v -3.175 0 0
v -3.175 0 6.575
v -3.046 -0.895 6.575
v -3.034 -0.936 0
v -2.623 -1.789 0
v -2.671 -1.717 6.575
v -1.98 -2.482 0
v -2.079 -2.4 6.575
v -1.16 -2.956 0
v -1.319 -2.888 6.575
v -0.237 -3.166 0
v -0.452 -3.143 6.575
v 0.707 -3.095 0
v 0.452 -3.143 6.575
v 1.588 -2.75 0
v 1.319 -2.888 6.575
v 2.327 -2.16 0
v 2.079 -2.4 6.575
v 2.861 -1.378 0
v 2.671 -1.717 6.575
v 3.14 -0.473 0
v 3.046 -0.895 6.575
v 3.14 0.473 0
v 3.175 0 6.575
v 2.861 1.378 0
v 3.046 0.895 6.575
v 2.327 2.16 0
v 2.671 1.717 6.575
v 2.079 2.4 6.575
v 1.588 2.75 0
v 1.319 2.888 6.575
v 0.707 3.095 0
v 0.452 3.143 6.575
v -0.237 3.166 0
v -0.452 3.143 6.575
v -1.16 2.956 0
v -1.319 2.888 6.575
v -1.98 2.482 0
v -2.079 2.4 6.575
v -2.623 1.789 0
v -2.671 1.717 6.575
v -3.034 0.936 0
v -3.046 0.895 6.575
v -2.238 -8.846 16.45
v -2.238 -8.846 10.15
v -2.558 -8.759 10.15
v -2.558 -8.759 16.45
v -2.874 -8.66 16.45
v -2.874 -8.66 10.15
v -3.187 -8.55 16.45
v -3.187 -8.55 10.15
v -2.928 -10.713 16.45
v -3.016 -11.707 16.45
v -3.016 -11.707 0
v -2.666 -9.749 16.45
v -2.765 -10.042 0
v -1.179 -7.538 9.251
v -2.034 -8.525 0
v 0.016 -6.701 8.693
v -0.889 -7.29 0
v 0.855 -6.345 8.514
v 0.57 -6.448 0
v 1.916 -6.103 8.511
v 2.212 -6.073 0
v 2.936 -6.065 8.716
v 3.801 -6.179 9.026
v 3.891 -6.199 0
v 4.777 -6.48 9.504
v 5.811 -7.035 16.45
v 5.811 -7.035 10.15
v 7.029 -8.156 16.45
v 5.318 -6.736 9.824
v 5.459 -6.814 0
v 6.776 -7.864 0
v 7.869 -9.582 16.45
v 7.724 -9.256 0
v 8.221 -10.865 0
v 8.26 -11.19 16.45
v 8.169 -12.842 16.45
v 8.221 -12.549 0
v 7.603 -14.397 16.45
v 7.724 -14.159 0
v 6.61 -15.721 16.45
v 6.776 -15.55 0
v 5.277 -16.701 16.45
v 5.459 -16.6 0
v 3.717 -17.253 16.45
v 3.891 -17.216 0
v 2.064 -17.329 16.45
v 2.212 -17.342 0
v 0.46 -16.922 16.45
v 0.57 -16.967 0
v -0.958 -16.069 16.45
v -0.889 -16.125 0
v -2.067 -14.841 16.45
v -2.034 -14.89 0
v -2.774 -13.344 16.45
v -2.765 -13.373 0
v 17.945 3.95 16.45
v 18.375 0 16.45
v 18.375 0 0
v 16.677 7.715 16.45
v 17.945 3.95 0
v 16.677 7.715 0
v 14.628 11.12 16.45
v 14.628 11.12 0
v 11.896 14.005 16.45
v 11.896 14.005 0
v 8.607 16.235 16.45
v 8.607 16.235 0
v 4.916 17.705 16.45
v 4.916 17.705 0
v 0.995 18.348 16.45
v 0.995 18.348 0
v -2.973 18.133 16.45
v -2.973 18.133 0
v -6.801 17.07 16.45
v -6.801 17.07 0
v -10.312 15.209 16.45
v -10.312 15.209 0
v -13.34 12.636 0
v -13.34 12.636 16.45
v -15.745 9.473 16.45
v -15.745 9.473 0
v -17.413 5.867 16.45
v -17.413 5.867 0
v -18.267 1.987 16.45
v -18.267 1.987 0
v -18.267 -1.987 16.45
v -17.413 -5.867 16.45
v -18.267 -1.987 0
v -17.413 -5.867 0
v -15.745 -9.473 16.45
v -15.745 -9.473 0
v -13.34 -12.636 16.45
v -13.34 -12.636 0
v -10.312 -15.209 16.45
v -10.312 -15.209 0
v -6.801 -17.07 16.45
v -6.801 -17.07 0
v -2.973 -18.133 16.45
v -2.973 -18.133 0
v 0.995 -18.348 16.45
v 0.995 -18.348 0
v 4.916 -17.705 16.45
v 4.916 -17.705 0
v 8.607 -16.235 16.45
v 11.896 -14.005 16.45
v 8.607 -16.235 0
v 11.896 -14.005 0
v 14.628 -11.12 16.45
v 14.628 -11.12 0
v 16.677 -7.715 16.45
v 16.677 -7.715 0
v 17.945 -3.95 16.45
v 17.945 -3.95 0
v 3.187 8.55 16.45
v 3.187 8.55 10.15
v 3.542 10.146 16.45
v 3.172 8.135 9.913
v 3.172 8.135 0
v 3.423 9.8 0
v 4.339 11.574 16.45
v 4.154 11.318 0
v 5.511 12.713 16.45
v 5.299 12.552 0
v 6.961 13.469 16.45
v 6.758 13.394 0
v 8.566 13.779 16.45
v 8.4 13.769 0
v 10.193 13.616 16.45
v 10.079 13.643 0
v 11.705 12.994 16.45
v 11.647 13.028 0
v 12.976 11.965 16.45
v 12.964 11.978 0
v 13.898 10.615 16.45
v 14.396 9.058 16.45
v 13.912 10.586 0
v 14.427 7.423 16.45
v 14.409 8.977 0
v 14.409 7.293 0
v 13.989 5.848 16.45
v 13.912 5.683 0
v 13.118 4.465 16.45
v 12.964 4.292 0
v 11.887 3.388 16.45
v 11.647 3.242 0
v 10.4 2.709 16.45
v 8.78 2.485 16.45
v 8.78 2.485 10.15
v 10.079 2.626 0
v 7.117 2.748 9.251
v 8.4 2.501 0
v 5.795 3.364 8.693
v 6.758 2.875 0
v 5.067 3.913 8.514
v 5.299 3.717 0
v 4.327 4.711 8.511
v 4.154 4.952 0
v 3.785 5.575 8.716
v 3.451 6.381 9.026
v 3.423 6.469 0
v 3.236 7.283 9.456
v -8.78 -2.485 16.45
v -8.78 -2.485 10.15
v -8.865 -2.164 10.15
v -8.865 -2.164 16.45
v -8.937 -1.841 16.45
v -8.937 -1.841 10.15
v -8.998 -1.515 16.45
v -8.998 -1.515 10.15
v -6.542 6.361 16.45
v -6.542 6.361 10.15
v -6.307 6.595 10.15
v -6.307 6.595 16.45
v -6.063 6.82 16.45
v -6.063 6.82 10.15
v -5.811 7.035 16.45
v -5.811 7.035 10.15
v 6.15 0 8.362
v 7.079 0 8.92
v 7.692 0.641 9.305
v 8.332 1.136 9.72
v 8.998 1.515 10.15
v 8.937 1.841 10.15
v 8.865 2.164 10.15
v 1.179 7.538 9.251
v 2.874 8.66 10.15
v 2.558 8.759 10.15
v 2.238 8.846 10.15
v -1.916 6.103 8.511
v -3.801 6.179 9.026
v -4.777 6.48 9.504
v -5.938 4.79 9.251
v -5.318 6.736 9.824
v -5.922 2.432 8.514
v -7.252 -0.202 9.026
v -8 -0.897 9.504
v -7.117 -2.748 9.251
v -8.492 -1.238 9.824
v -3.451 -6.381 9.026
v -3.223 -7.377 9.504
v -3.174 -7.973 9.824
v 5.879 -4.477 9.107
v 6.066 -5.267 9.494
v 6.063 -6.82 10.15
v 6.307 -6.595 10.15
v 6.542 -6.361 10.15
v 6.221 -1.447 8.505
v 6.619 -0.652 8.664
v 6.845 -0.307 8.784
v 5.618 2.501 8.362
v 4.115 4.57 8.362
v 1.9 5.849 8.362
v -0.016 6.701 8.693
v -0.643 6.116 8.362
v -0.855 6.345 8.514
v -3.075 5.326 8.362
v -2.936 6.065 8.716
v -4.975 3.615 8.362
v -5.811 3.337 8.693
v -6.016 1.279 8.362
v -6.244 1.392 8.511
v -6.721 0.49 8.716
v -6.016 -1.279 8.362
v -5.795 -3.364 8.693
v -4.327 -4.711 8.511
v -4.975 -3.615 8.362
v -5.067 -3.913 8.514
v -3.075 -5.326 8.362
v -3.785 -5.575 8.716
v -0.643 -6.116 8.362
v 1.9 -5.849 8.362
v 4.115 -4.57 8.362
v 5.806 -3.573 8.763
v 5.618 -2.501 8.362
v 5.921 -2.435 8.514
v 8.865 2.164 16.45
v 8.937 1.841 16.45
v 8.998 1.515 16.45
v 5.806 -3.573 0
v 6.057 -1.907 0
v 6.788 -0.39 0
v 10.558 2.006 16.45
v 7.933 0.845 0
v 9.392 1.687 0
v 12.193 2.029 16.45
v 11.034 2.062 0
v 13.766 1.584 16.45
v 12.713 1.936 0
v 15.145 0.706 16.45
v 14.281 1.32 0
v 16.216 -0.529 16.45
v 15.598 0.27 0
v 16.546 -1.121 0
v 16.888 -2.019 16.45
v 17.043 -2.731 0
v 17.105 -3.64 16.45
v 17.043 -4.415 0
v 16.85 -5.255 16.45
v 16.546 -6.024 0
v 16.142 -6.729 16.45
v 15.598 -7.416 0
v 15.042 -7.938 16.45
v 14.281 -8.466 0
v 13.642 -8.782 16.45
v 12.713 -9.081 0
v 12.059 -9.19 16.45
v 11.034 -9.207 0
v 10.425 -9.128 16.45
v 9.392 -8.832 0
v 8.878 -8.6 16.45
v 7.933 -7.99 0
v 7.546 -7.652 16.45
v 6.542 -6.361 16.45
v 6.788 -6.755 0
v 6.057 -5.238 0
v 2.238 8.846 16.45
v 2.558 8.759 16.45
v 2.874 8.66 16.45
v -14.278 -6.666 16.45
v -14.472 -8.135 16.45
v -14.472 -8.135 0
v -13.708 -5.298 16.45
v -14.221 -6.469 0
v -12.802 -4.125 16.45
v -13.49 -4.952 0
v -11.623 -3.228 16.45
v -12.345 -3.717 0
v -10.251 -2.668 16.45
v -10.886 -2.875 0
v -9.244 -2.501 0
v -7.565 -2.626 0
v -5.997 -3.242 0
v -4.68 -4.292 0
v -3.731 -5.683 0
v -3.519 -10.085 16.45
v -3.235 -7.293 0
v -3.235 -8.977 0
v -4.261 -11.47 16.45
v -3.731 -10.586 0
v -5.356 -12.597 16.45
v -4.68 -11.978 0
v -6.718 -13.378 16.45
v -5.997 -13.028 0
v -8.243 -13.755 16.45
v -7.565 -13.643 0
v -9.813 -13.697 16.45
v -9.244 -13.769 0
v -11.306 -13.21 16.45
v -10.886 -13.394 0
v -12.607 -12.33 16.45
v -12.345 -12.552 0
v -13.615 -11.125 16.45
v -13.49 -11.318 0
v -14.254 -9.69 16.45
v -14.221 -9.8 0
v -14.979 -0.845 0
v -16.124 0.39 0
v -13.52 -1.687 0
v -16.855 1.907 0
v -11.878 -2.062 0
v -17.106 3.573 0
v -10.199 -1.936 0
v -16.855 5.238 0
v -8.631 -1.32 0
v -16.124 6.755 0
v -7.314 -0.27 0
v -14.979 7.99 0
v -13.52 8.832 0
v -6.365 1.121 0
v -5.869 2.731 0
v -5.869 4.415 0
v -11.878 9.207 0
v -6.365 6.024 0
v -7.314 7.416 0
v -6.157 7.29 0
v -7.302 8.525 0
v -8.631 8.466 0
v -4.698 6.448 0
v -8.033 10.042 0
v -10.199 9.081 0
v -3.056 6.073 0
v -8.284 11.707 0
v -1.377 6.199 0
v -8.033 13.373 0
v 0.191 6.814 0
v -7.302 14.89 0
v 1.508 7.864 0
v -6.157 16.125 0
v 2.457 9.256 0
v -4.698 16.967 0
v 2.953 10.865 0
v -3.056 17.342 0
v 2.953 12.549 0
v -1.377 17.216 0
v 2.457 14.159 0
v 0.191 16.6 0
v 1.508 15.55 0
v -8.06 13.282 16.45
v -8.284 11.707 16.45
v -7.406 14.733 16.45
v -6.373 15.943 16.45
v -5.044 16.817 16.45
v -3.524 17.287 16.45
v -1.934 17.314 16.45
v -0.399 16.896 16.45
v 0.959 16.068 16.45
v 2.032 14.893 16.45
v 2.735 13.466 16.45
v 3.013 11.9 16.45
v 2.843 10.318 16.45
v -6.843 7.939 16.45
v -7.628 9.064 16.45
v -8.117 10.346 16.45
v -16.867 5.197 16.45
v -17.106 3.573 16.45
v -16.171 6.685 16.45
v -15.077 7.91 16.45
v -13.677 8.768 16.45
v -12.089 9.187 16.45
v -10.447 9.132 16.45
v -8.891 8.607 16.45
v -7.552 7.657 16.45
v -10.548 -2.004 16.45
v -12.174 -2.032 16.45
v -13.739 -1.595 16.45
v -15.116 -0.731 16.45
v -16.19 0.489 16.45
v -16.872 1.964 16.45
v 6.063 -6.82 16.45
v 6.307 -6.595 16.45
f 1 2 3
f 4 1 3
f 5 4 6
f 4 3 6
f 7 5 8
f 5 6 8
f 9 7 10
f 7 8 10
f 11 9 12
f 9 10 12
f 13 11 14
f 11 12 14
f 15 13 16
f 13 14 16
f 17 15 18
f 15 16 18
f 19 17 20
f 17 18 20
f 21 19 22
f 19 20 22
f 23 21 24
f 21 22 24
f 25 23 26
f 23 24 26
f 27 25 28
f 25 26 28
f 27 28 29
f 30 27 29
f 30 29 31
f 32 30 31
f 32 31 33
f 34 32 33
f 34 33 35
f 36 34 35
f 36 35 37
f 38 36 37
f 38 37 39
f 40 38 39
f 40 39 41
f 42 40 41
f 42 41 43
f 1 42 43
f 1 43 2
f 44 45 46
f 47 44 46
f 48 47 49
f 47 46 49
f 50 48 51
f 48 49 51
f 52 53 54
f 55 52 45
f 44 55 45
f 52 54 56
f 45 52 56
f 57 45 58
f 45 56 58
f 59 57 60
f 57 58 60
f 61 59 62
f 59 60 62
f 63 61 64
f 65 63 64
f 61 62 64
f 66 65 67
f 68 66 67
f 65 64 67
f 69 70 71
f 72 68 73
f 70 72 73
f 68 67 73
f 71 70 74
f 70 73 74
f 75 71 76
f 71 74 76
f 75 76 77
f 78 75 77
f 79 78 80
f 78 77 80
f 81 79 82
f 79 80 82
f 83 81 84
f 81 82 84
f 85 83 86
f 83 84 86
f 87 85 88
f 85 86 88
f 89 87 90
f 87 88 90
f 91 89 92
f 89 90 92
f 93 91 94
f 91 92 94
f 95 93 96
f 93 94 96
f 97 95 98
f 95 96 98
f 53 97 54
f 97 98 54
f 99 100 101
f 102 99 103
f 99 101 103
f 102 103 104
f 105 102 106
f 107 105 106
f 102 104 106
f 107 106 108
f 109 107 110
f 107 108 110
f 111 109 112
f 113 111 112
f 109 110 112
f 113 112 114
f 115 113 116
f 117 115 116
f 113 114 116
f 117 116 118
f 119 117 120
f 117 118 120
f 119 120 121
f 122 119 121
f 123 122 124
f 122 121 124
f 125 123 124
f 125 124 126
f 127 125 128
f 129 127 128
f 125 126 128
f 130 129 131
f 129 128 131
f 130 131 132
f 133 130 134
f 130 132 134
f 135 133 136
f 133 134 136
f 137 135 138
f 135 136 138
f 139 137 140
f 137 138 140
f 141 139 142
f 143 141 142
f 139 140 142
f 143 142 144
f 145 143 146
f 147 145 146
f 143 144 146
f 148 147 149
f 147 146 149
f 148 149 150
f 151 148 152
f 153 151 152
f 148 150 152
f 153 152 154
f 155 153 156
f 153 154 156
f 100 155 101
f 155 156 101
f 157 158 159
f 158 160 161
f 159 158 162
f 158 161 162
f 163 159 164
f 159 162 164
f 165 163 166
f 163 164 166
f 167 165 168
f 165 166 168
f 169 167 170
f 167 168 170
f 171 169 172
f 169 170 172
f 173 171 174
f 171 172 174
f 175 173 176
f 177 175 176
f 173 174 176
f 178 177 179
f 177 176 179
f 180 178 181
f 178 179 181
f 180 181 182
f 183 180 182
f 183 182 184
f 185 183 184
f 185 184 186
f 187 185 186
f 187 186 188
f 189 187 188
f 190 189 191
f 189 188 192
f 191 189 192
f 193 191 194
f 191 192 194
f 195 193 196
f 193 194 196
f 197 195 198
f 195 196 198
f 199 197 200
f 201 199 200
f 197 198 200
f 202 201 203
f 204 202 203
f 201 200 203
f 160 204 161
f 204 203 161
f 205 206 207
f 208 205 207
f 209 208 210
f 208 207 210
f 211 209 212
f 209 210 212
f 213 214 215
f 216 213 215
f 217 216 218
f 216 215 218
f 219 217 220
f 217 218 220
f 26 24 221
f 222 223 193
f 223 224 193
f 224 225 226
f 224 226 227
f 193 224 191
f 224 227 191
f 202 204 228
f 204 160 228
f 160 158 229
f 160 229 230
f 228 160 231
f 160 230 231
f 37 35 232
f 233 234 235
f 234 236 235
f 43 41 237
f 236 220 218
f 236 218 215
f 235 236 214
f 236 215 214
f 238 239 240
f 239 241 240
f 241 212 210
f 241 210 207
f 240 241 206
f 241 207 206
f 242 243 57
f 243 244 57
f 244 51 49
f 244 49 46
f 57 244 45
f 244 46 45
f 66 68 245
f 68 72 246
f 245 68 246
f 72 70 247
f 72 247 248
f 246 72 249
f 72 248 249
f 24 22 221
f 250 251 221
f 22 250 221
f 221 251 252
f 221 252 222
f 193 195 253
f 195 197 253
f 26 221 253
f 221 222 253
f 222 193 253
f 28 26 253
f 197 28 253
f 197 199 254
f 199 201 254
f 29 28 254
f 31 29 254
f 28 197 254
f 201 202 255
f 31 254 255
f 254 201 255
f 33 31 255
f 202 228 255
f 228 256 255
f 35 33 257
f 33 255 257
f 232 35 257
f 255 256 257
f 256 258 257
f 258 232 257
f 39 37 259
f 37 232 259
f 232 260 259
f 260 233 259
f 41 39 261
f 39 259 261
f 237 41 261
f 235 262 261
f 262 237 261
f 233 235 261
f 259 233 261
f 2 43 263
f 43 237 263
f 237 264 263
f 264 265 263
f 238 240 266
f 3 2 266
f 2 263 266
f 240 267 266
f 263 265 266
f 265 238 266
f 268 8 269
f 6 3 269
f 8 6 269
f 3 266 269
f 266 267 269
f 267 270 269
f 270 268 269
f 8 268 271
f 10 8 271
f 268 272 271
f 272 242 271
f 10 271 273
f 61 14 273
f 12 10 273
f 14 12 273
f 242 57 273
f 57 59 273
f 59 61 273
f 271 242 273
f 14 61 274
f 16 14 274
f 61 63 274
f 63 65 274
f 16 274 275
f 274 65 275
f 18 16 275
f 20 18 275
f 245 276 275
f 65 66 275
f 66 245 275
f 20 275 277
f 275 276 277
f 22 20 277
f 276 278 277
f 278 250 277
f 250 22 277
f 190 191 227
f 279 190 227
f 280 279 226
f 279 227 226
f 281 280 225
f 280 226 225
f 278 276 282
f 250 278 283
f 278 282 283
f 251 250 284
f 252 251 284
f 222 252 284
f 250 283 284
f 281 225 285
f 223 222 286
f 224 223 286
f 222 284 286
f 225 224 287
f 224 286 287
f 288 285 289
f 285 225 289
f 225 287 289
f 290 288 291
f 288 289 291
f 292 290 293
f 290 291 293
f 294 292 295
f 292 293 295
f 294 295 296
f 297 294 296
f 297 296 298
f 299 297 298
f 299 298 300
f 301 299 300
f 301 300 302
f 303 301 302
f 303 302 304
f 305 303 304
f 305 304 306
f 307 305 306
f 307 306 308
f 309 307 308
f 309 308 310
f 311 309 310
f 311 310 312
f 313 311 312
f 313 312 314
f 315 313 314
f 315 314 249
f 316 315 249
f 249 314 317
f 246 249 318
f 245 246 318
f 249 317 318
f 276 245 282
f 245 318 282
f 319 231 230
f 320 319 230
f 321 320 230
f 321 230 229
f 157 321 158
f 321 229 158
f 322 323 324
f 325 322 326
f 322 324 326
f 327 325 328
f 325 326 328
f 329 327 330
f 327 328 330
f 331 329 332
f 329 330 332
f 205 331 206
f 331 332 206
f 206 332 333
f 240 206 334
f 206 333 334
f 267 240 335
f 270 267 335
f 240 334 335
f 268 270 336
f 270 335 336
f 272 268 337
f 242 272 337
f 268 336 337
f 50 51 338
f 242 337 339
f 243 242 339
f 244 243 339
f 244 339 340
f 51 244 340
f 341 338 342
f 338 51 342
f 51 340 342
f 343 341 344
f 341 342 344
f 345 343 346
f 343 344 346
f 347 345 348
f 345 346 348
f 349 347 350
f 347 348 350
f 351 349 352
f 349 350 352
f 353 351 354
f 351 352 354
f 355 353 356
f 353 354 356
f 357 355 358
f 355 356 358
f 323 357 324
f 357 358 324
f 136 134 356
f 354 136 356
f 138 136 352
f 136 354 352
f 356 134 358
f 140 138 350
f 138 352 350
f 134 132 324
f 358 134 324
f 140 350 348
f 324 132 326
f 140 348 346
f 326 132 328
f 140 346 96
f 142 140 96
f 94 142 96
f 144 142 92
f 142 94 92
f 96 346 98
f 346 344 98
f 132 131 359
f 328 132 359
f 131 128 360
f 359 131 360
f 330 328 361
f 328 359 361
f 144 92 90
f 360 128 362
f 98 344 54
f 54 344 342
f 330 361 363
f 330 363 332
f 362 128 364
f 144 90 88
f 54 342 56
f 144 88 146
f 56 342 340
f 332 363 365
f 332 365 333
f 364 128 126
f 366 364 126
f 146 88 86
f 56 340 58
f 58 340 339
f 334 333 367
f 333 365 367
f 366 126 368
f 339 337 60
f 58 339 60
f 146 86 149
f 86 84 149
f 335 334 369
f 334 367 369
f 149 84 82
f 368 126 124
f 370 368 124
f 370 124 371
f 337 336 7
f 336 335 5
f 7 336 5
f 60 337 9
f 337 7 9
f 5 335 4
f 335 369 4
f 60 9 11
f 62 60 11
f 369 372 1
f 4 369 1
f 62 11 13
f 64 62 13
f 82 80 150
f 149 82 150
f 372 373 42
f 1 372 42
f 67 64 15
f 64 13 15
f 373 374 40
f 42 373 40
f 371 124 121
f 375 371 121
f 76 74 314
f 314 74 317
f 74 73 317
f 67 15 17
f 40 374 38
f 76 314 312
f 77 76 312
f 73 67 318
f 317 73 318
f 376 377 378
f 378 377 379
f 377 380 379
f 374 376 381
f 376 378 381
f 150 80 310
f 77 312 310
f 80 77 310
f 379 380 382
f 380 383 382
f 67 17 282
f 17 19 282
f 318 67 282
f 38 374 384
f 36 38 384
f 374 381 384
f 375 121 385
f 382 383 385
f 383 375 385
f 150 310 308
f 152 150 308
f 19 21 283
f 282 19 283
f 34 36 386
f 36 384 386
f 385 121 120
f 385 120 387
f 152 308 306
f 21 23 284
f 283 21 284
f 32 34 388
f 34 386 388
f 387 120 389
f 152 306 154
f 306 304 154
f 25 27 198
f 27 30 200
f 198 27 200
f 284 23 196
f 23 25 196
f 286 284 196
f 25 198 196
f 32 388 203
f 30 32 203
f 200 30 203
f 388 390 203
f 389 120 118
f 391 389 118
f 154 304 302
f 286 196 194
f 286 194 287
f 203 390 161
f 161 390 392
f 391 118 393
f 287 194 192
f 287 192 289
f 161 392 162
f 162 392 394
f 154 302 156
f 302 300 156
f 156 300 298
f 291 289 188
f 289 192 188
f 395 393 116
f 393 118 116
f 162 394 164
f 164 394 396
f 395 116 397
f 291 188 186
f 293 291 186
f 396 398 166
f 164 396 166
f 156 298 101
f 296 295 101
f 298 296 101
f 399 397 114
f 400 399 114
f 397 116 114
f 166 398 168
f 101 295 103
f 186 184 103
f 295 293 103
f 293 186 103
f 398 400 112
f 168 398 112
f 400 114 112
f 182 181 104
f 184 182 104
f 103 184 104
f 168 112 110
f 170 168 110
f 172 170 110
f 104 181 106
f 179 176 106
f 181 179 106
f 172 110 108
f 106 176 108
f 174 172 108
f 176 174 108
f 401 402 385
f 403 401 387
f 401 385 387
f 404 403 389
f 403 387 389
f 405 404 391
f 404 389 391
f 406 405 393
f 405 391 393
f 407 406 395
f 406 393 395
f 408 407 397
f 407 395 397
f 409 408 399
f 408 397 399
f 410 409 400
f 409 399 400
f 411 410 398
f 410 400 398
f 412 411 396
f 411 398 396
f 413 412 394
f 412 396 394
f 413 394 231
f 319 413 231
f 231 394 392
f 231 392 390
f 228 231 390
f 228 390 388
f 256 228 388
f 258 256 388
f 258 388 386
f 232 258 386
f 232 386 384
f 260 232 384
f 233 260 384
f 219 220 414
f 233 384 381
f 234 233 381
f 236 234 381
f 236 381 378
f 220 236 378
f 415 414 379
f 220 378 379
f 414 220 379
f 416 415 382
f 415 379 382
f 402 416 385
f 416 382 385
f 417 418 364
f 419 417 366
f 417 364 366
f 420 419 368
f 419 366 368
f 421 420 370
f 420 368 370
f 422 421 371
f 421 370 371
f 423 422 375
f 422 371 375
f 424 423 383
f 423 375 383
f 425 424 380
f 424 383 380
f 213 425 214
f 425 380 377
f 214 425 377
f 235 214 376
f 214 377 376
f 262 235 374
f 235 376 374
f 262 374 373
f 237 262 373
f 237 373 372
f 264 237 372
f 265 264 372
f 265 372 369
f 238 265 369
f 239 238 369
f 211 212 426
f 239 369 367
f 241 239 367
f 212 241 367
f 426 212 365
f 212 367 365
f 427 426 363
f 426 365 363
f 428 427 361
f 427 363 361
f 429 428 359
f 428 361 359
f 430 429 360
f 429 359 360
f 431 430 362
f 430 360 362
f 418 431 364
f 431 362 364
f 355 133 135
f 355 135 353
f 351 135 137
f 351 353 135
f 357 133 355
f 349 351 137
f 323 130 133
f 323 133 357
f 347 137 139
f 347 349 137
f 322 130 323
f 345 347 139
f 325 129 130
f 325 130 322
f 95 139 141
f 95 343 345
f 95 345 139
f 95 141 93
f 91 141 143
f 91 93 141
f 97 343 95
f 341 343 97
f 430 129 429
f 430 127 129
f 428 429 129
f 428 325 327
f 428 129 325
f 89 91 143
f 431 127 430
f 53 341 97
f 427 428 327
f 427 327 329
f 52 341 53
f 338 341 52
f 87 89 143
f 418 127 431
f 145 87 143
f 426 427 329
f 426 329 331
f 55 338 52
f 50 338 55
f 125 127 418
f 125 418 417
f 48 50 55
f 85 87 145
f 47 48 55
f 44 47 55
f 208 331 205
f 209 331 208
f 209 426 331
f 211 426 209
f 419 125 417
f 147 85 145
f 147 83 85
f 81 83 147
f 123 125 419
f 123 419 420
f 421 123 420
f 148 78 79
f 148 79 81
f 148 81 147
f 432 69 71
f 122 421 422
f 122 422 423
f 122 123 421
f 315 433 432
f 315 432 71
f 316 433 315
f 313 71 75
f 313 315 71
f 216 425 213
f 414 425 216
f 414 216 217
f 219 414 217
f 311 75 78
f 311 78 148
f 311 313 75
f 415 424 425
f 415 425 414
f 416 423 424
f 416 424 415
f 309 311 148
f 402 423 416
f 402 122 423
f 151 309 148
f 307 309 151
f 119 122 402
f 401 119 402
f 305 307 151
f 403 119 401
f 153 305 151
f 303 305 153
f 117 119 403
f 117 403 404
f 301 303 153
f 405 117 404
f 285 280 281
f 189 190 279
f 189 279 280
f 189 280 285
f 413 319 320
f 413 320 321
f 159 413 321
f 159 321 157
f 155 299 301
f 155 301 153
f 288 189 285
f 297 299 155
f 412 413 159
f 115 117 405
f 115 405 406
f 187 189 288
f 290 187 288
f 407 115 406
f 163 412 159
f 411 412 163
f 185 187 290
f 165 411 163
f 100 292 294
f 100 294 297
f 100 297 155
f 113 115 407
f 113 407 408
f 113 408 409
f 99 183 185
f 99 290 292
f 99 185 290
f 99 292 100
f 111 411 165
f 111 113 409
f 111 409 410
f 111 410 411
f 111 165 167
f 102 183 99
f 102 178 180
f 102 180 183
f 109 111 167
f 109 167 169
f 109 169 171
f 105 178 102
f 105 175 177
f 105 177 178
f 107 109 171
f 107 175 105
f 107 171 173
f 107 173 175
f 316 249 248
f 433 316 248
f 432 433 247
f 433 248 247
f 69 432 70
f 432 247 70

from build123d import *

# Parameters (mm, degrees)
F0_R     = 18.375
F1_DEPTH = 16.45
F3_D     = 11.3
F5_D     = 18.25
F5_DEPTH = 6.3
F5_TIP   = 5.4828531486
F7_D     = 6.35


with BuildPart() as f1:
    # F0 (on Top) → F1 (new body)
    with BuildSketch(Plane.XY):
        Circle(F0_R)
    extrude(amount=F1_DEPTH)

    # F3 (through all)
    with Locations(Plane.XY.offset(16.45)):
        with Locations((-8.8218893741, -8.1347567801), (-2.6339613381, 11.7073586974), (-11.4558507122, 3.5726019173), (2.6339613381, -11.7073586974), (11.4558507122, -3.5726019173), (8.8218893741, 8.1347567801)):
            Hole(F3_D / 2)

    # F5
    with Locations(Plane.XY.offset(16.45)):
        with Locations((0, 0)):
            Hole(F5_D / 2, depth=F5_DEPTH)
            with Locations((0, 0, -(F5_DEPTH + F5_TIP / 2))):  # 118° drill point
                Cone(0, F5_D / 2, F5_TIP, mode=Mode.SUBTRACT)

    # F7 (through all)
    with Locations(Plane(origin=(0, 0, 0), x_dir=(1, 0, 0), z_dir=(0, 0, -1))):
        with Locations((0, 0)):
            Hole(F7_D / 2)


solid = f1.part
